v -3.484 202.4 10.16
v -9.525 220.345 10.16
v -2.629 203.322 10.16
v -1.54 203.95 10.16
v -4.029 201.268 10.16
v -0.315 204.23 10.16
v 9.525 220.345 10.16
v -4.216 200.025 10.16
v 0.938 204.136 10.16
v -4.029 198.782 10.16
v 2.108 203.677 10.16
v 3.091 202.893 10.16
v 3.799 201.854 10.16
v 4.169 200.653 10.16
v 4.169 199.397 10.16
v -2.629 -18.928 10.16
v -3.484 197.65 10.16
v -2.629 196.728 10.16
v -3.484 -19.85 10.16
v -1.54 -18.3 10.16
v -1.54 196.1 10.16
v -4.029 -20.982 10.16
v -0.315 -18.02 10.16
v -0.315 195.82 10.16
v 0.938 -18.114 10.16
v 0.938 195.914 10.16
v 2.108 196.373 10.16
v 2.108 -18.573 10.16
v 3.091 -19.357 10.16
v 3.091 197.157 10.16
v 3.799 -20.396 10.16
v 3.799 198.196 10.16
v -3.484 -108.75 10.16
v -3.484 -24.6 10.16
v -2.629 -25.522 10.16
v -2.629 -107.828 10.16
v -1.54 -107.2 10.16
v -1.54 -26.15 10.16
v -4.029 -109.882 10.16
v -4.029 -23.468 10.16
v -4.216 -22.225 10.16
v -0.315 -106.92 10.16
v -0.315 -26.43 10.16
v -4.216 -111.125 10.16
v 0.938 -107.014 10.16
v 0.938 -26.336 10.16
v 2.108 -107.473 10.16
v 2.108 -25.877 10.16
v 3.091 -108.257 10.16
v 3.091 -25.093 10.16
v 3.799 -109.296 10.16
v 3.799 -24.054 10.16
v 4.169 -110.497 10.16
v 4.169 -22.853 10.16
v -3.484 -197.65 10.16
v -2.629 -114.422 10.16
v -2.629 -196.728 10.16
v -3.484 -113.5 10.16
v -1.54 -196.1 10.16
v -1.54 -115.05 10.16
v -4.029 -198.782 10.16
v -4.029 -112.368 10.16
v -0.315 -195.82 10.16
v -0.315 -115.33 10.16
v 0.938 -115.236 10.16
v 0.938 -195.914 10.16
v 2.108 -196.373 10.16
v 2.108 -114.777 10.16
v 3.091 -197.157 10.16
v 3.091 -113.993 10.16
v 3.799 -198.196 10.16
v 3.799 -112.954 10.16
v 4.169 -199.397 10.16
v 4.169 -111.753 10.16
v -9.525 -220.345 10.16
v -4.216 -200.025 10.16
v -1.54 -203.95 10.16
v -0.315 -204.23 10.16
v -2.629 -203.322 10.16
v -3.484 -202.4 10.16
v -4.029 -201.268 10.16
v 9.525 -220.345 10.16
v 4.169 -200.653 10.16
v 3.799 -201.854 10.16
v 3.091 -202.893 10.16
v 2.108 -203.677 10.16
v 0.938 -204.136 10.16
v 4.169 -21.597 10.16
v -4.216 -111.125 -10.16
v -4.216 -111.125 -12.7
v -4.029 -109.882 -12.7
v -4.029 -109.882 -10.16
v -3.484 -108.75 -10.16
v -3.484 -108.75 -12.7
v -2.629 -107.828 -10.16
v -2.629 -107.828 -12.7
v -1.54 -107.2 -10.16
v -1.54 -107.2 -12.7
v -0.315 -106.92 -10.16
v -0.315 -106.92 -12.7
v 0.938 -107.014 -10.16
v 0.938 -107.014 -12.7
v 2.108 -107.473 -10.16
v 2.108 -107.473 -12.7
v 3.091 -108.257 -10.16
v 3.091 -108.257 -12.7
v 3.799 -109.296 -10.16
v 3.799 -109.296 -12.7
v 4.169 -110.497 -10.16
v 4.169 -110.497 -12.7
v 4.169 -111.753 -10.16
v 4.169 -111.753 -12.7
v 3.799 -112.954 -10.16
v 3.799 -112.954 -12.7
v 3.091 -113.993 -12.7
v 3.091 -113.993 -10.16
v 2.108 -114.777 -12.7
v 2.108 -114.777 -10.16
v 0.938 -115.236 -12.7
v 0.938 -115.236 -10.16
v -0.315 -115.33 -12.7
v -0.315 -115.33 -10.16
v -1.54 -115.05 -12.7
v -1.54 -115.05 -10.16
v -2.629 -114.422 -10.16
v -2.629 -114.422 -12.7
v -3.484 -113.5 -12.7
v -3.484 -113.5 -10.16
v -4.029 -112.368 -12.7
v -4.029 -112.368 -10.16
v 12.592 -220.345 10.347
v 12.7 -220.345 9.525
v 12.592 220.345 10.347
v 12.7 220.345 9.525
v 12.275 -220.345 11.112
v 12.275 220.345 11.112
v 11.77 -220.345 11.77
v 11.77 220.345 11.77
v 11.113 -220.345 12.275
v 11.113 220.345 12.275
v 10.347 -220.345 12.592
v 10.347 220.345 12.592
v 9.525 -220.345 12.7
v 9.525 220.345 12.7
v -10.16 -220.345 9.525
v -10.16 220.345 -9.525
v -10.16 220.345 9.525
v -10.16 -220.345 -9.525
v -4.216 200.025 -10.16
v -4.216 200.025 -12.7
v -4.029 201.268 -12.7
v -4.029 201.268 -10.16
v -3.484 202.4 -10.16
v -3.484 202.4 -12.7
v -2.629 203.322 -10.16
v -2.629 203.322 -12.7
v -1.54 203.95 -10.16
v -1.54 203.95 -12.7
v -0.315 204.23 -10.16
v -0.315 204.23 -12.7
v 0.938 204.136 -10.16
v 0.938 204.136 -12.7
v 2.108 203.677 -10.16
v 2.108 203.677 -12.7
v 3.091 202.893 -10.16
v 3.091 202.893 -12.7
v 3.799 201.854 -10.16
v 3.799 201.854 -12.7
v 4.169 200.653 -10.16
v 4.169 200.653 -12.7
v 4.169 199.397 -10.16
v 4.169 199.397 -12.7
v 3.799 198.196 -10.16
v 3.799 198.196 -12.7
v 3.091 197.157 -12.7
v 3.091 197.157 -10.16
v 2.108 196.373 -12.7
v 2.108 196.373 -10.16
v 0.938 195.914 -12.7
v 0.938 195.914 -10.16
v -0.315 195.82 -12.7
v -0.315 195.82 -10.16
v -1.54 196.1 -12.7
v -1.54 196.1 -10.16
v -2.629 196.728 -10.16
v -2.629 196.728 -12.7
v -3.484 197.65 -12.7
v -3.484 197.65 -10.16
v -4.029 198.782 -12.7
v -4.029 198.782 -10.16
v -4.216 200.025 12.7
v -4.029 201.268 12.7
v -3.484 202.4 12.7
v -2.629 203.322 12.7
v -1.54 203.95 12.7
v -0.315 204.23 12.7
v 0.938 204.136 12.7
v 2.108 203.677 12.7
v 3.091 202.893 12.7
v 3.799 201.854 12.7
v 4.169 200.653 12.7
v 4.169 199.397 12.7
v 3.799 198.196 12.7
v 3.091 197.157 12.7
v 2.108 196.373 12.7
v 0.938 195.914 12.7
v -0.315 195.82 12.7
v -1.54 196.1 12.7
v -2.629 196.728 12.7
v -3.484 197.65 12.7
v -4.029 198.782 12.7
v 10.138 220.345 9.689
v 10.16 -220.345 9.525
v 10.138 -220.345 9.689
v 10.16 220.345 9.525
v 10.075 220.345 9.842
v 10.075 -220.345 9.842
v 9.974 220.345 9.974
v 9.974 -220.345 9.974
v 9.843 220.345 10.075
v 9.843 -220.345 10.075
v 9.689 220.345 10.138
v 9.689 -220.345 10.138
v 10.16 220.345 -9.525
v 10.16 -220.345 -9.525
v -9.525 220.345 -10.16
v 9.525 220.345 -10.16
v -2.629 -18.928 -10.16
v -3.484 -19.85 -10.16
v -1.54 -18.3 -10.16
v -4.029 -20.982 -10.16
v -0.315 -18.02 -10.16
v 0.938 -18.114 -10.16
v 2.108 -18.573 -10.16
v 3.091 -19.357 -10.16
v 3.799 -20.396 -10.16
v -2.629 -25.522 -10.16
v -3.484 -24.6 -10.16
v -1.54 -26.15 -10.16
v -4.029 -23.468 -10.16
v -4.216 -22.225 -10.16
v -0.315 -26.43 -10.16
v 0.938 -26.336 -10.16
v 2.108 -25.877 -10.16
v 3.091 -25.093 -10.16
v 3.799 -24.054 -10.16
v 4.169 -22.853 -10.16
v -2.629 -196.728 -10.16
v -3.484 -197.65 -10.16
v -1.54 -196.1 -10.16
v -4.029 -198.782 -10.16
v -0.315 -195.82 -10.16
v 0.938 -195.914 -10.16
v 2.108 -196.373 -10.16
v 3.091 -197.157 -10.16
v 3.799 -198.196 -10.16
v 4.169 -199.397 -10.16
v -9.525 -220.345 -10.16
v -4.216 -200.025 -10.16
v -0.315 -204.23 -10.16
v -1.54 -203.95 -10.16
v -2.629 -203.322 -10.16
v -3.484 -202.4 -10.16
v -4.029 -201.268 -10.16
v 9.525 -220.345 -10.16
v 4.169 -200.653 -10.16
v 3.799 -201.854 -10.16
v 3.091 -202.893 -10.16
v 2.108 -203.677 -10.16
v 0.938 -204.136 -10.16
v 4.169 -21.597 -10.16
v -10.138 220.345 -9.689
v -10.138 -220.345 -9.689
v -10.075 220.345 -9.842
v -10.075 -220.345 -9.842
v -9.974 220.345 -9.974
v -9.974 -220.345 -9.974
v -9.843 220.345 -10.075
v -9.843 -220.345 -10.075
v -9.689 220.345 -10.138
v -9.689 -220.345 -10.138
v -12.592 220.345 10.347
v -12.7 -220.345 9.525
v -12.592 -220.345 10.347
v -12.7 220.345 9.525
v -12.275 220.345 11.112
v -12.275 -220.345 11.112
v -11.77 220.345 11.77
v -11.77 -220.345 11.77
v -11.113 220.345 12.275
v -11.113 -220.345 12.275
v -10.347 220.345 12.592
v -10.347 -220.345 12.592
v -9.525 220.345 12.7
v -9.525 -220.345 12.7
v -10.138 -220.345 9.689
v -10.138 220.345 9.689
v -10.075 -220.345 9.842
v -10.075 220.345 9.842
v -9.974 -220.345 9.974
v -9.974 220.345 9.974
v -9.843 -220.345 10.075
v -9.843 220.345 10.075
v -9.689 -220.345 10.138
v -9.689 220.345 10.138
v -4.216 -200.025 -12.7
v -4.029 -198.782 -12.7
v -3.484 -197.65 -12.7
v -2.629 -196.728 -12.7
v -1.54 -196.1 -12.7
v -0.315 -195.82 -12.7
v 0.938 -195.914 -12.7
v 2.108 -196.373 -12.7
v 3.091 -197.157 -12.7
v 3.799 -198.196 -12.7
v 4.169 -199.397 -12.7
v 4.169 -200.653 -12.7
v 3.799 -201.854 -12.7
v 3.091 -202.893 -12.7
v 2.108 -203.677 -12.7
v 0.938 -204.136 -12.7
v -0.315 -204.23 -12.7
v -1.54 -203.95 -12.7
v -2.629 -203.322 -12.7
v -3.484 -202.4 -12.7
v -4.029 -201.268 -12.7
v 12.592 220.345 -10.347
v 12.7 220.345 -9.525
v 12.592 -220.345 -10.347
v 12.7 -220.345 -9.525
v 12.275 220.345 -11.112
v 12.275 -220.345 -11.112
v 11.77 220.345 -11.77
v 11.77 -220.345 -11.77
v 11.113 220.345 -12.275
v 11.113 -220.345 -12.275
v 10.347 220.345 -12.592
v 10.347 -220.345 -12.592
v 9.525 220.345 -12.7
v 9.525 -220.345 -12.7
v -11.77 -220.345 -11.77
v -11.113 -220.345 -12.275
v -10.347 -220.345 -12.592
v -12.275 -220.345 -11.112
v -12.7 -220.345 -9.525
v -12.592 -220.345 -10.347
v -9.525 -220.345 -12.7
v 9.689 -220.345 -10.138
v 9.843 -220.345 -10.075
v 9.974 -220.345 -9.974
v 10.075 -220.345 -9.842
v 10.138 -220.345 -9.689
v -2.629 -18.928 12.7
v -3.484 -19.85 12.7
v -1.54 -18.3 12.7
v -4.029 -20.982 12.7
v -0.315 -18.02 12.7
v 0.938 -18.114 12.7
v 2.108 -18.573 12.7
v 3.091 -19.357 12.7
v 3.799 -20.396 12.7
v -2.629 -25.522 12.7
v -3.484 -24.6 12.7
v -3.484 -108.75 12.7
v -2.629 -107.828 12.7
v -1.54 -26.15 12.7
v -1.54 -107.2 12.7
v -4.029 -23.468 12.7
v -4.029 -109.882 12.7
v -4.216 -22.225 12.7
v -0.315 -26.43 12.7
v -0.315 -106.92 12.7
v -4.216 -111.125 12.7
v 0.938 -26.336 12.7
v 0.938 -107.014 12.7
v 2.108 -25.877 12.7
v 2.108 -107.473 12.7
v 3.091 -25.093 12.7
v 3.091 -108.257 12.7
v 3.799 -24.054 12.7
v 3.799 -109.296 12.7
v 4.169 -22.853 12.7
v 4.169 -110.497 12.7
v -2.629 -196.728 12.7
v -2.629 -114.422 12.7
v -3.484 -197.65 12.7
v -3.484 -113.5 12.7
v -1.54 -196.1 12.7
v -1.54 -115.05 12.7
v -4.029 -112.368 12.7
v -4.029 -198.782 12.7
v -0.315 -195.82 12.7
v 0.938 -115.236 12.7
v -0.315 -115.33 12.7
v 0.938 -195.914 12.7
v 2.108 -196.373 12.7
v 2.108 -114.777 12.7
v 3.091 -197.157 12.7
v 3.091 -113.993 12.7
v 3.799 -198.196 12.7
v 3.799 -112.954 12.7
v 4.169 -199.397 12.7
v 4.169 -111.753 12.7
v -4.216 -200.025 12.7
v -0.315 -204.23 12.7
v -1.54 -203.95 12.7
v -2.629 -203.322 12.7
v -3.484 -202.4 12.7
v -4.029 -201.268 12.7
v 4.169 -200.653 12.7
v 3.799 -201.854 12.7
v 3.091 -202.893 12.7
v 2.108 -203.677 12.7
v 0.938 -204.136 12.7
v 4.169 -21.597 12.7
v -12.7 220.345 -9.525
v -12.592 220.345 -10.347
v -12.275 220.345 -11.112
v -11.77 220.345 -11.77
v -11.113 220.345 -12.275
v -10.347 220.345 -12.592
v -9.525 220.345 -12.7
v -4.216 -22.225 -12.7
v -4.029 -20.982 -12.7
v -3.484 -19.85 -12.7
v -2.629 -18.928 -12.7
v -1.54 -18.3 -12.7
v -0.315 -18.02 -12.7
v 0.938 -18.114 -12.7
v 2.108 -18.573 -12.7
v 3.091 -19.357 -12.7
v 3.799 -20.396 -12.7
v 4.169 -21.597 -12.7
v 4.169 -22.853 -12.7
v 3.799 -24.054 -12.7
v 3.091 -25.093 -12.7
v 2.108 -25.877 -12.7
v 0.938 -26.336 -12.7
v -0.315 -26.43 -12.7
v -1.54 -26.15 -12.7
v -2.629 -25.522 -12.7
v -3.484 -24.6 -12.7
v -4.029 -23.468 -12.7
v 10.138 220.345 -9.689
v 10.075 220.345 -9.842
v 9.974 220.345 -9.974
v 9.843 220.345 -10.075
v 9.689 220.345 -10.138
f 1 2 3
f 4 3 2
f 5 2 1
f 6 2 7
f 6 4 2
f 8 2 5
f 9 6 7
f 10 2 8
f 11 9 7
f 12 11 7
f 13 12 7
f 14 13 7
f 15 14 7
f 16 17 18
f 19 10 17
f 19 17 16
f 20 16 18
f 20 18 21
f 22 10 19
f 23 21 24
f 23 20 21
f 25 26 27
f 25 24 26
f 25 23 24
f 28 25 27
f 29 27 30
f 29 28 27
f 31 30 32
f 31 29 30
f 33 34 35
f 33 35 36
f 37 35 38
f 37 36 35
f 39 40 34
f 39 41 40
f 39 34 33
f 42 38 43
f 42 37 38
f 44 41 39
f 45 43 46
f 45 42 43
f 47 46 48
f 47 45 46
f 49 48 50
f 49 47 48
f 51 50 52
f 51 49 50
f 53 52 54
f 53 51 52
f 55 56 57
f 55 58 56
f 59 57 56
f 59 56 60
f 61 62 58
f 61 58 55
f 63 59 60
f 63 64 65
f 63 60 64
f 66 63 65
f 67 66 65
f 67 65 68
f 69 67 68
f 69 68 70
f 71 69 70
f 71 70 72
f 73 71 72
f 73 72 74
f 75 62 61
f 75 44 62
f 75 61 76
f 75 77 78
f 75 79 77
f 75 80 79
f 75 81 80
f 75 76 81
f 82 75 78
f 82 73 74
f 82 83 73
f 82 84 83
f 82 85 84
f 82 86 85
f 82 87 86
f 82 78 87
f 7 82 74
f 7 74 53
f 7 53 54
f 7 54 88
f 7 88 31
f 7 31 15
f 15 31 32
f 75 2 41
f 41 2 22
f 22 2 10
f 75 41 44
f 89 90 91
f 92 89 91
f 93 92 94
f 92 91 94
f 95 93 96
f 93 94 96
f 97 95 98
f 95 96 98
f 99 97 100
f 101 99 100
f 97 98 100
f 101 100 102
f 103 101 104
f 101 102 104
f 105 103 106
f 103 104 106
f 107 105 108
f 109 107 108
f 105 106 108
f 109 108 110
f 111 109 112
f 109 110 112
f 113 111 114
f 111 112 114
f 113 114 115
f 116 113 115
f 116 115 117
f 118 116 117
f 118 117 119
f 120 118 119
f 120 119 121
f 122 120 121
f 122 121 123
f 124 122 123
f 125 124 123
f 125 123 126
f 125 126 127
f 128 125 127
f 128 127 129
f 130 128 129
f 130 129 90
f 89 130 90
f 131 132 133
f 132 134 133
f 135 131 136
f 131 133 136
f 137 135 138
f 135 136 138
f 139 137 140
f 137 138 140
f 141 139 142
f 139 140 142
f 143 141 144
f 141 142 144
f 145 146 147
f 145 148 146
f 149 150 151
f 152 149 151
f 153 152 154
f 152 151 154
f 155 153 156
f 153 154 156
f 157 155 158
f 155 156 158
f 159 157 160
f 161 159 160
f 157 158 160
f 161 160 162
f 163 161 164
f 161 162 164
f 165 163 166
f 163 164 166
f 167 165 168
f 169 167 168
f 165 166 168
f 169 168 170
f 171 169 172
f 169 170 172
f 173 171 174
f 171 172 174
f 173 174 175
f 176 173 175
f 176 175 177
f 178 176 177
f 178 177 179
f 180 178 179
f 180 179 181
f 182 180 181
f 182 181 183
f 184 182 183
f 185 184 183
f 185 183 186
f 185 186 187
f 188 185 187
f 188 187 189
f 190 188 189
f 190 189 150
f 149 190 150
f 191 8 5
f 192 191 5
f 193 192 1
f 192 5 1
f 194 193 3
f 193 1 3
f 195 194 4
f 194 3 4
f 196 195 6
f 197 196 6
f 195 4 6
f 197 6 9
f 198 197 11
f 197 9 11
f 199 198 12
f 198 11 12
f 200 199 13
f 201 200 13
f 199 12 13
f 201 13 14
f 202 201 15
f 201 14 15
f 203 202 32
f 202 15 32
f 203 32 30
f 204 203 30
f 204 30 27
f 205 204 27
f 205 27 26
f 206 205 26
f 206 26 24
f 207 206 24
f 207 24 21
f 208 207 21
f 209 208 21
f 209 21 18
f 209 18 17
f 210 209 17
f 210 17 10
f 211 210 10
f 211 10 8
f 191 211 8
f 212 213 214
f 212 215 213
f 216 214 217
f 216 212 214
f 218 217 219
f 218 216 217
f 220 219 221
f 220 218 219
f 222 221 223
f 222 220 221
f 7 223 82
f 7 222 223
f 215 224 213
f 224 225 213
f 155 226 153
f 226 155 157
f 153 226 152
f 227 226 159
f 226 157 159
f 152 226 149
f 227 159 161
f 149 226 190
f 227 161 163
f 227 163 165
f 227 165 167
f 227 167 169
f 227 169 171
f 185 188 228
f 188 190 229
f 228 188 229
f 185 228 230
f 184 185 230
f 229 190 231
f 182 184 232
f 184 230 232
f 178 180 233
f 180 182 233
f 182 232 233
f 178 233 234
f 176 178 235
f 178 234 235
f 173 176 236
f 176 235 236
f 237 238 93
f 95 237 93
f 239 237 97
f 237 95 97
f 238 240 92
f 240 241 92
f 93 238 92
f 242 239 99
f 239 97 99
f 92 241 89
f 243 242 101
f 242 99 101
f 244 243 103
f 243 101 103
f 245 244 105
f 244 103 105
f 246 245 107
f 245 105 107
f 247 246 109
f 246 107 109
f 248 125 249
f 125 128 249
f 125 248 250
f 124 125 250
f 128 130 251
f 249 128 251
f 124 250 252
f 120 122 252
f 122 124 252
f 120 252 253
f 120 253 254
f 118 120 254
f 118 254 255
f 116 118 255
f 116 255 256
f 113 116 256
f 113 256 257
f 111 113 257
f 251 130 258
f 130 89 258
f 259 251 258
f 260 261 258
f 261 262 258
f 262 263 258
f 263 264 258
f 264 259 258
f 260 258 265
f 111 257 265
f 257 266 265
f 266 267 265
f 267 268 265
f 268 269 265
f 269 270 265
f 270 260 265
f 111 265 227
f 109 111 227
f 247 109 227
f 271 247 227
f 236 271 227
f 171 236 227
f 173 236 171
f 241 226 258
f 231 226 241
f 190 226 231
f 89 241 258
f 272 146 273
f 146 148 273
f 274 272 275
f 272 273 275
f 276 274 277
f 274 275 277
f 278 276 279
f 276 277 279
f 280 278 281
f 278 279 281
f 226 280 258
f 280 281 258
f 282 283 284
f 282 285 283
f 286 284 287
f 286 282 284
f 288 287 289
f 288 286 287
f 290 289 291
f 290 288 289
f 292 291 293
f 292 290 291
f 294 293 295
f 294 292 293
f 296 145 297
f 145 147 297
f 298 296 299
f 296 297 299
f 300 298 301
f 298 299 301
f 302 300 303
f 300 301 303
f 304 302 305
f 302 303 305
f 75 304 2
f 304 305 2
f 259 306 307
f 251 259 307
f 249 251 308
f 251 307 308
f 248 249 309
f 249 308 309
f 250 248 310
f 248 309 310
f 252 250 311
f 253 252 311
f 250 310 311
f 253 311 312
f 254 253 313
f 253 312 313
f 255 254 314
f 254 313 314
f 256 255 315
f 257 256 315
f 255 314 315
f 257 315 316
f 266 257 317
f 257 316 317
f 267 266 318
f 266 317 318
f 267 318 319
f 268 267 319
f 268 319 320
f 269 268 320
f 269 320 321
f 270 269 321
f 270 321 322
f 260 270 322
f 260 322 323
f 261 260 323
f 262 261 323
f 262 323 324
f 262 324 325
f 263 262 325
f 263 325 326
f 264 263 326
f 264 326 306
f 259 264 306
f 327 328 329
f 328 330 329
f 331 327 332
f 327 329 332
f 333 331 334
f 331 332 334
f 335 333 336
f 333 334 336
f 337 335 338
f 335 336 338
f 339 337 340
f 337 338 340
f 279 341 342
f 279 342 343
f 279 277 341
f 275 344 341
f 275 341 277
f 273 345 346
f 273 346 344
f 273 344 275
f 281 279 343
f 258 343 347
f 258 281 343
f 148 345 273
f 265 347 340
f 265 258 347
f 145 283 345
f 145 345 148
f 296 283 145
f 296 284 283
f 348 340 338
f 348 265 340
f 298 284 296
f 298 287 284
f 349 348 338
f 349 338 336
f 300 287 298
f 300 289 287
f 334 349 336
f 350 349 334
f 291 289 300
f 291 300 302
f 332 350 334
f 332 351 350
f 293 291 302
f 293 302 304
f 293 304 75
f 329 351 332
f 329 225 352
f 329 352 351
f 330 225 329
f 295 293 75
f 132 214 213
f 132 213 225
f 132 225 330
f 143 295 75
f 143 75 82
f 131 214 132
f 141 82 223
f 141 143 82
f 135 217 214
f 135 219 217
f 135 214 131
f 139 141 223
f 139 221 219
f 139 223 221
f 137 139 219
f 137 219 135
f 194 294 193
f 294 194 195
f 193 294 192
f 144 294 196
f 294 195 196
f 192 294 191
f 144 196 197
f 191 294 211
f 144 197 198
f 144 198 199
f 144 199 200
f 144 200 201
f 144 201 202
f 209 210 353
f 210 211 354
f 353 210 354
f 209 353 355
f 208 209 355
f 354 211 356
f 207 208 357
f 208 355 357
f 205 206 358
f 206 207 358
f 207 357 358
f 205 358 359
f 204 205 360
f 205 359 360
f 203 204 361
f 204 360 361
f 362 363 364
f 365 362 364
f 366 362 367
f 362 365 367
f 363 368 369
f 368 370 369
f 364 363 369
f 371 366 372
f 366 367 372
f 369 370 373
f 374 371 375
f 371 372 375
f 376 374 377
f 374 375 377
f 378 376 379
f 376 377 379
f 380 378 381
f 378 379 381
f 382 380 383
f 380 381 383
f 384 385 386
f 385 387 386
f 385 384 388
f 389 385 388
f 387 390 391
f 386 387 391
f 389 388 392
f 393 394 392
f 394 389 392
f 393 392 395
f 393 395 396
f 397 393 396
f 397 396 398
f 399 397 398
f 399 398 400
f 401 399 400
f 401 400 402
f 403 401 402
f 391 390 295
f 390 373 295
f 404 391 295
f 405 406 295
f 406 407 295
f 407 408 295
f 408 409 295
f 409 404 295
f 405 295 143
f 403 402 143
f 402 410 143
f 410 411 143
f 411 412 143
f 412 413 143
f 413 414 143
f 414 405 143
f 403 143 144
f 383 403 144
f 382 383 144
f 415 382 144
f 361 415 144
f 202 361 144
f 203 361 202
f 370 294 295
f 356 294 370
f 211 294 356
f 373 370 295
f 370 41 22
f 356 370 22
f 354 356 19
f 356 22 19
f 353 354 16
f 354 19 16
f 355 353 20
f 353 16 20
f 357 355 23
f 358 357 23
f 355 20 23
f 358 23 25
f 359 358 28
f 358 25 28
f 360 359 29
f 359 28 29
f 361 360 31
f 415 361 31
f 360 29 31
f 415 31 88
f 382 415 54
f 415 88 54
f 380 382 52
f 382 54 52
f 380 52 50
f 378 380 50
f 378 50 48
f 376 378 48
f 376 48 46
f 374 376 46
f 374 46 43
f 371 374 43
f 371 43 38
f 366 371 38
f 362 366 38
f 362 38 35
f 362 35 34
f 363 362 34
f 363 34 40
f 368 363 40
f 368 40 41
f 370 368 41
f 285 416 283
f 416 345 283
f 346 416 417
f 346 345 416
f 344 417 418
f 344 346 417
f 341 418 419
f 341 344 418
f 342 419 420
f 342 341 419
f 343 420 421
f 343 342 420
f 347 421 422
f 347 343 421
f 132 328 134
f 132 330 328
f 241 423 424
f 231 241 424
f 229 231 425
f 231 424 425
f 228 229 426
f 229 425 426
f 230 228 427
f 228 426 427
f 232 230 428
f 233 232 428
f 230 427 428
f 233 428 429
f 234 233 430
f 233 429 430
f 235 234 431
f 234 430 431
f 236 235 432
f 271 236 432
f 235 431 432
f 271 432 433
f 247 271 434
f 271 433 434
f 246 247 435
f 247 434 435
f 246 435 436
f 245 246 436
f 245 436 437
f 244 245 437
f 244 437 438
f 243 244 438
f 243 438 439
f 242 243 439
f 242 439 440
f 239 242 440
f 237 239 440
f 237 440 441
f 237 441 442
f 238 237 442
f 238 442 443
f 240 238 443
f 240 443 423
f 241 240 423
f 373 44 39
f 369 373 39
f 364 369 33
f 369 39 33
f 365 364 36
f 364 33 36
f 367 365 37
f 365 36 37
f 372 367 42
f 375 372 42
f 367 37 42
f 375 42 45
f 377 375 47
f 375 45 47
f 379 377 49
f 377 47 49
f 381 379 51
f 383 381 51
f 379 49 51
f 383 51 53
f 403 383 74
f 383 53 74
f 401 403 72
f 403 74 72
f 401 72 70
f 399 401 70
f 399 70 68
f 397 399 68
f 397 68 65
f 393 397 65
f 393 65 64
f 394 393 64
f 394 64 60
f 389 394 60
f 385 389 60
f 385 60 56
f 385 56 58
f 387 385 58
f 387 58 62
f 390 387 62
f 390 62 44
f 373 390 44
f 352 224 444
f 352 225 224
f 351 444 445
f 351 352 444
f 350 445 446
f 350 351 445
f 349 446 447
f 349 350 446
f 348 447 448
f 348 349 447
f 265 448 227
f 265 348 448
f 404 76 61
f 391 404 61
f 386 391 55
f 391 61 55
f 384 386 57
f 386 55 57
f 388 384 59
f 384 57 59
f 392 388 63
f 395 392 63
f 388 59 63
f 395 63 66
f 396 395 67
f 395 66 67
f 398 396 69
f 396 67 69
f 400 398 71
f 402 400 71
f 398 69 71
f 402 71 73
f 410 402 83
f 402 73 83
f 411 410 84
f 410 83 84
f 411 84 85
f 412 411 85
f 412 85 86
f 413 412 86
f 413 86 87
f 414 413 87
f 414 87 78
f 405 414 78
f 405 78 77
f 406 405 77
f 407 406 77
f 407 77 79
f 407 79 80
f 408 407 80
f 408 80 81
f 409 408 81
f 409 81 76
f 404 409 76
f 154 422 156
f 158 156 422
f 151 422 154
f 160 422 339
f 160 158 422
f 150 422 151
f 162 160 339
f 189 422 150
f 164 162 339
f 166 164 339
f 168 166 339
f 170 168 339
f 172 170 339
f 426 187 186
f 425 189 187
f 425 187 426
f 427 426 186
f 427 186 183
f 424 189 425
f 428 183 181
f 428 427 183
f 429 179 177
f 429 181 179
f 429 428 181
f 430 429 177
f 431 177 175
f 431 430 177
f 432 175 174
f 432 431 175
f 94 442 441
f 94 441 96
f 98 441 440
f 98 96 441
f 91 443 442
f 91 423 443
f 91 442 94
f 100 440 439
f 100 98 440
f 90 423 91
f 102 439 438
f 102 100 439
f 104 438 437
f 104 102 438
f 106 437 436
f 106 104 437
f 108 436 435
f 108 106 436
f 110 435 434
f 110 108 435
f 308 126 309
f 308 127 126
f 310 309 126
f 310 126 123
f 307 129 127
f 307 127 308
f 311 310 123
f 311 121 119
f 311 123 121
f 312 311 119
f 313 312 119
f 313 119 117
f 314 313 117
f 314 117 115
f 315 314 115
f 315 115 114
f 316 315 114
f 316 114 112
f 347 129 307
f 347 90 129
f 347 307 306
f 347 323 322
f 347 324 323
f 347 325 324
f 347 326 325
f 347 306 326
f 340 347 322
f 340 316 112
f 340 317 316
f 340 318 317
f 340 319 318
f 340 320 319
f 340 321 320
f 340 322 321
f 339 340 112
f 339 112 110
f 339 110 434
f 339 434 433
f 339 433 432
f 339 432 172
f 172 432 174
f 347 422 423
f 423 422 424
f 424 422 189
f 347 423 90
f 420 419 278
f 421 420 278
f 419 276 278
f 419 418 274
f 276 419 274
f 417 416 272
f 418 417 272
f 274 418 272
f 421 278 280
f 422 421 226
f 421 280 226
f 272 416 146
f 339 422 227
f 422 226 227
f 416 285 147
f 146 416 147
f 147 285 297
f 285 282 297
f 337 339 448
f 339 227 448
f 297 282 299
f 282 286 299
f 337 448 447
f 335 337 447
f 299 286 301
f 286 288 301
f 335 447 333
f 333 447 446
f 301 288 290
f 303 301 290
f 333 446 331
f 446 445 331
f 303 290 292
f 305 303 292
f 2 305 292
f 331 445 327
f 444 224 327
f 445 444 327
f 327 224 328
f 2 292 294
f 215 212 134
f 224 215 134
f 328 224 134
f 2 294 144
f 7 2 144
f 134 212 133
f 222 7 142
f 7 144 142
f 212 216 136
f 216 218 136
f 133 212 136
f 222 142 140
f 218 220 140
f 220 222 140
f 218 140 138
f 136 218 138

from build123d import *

# Parameters (mm, degrees)
F0_W     = 25.4
F0_H     = 25.4
F1_DEPTH = 220.345
F2_R     = 3.175
F3_T     = -2.54
F5_D     = 8.4328


with BuildPart() as f1:
    # F0 (on Front) → F1 (new body, symmetric)
    with BuildSketch(Plane.XZ):
        Rectangle(F0_W, F0_H)
    extrude(amount=F1_DEPTH, both=True)

    # F2
    f2_edges = [f1.edges().sort_by_distance(p)[0] for p in [
        (-12.7, 0, 12.7),
        (12.7, 0, 12.7),
        (-12.7, 0, -12.7),
        (12.7, 0, -12.7),
    ]]
    fillet(f2_edges, radius=F2_R)

    # F3
    f3_openings = [f1.faces().sort_by_distance(p)[0] for p in [
        (0, -220.345, 0),
        (0, 220.345, 0),
    ]]
    offset(amount=F3_T, openings=f3_openings)

    # F5 (through all)
    with Locations(Plane.XY.offset(12.7)):
        with Locations((0, -200.025), (0, -22.225), (0, 200.025), (0, -111.125)):
            Hole(F5_D / 2)


solid = f1.part
